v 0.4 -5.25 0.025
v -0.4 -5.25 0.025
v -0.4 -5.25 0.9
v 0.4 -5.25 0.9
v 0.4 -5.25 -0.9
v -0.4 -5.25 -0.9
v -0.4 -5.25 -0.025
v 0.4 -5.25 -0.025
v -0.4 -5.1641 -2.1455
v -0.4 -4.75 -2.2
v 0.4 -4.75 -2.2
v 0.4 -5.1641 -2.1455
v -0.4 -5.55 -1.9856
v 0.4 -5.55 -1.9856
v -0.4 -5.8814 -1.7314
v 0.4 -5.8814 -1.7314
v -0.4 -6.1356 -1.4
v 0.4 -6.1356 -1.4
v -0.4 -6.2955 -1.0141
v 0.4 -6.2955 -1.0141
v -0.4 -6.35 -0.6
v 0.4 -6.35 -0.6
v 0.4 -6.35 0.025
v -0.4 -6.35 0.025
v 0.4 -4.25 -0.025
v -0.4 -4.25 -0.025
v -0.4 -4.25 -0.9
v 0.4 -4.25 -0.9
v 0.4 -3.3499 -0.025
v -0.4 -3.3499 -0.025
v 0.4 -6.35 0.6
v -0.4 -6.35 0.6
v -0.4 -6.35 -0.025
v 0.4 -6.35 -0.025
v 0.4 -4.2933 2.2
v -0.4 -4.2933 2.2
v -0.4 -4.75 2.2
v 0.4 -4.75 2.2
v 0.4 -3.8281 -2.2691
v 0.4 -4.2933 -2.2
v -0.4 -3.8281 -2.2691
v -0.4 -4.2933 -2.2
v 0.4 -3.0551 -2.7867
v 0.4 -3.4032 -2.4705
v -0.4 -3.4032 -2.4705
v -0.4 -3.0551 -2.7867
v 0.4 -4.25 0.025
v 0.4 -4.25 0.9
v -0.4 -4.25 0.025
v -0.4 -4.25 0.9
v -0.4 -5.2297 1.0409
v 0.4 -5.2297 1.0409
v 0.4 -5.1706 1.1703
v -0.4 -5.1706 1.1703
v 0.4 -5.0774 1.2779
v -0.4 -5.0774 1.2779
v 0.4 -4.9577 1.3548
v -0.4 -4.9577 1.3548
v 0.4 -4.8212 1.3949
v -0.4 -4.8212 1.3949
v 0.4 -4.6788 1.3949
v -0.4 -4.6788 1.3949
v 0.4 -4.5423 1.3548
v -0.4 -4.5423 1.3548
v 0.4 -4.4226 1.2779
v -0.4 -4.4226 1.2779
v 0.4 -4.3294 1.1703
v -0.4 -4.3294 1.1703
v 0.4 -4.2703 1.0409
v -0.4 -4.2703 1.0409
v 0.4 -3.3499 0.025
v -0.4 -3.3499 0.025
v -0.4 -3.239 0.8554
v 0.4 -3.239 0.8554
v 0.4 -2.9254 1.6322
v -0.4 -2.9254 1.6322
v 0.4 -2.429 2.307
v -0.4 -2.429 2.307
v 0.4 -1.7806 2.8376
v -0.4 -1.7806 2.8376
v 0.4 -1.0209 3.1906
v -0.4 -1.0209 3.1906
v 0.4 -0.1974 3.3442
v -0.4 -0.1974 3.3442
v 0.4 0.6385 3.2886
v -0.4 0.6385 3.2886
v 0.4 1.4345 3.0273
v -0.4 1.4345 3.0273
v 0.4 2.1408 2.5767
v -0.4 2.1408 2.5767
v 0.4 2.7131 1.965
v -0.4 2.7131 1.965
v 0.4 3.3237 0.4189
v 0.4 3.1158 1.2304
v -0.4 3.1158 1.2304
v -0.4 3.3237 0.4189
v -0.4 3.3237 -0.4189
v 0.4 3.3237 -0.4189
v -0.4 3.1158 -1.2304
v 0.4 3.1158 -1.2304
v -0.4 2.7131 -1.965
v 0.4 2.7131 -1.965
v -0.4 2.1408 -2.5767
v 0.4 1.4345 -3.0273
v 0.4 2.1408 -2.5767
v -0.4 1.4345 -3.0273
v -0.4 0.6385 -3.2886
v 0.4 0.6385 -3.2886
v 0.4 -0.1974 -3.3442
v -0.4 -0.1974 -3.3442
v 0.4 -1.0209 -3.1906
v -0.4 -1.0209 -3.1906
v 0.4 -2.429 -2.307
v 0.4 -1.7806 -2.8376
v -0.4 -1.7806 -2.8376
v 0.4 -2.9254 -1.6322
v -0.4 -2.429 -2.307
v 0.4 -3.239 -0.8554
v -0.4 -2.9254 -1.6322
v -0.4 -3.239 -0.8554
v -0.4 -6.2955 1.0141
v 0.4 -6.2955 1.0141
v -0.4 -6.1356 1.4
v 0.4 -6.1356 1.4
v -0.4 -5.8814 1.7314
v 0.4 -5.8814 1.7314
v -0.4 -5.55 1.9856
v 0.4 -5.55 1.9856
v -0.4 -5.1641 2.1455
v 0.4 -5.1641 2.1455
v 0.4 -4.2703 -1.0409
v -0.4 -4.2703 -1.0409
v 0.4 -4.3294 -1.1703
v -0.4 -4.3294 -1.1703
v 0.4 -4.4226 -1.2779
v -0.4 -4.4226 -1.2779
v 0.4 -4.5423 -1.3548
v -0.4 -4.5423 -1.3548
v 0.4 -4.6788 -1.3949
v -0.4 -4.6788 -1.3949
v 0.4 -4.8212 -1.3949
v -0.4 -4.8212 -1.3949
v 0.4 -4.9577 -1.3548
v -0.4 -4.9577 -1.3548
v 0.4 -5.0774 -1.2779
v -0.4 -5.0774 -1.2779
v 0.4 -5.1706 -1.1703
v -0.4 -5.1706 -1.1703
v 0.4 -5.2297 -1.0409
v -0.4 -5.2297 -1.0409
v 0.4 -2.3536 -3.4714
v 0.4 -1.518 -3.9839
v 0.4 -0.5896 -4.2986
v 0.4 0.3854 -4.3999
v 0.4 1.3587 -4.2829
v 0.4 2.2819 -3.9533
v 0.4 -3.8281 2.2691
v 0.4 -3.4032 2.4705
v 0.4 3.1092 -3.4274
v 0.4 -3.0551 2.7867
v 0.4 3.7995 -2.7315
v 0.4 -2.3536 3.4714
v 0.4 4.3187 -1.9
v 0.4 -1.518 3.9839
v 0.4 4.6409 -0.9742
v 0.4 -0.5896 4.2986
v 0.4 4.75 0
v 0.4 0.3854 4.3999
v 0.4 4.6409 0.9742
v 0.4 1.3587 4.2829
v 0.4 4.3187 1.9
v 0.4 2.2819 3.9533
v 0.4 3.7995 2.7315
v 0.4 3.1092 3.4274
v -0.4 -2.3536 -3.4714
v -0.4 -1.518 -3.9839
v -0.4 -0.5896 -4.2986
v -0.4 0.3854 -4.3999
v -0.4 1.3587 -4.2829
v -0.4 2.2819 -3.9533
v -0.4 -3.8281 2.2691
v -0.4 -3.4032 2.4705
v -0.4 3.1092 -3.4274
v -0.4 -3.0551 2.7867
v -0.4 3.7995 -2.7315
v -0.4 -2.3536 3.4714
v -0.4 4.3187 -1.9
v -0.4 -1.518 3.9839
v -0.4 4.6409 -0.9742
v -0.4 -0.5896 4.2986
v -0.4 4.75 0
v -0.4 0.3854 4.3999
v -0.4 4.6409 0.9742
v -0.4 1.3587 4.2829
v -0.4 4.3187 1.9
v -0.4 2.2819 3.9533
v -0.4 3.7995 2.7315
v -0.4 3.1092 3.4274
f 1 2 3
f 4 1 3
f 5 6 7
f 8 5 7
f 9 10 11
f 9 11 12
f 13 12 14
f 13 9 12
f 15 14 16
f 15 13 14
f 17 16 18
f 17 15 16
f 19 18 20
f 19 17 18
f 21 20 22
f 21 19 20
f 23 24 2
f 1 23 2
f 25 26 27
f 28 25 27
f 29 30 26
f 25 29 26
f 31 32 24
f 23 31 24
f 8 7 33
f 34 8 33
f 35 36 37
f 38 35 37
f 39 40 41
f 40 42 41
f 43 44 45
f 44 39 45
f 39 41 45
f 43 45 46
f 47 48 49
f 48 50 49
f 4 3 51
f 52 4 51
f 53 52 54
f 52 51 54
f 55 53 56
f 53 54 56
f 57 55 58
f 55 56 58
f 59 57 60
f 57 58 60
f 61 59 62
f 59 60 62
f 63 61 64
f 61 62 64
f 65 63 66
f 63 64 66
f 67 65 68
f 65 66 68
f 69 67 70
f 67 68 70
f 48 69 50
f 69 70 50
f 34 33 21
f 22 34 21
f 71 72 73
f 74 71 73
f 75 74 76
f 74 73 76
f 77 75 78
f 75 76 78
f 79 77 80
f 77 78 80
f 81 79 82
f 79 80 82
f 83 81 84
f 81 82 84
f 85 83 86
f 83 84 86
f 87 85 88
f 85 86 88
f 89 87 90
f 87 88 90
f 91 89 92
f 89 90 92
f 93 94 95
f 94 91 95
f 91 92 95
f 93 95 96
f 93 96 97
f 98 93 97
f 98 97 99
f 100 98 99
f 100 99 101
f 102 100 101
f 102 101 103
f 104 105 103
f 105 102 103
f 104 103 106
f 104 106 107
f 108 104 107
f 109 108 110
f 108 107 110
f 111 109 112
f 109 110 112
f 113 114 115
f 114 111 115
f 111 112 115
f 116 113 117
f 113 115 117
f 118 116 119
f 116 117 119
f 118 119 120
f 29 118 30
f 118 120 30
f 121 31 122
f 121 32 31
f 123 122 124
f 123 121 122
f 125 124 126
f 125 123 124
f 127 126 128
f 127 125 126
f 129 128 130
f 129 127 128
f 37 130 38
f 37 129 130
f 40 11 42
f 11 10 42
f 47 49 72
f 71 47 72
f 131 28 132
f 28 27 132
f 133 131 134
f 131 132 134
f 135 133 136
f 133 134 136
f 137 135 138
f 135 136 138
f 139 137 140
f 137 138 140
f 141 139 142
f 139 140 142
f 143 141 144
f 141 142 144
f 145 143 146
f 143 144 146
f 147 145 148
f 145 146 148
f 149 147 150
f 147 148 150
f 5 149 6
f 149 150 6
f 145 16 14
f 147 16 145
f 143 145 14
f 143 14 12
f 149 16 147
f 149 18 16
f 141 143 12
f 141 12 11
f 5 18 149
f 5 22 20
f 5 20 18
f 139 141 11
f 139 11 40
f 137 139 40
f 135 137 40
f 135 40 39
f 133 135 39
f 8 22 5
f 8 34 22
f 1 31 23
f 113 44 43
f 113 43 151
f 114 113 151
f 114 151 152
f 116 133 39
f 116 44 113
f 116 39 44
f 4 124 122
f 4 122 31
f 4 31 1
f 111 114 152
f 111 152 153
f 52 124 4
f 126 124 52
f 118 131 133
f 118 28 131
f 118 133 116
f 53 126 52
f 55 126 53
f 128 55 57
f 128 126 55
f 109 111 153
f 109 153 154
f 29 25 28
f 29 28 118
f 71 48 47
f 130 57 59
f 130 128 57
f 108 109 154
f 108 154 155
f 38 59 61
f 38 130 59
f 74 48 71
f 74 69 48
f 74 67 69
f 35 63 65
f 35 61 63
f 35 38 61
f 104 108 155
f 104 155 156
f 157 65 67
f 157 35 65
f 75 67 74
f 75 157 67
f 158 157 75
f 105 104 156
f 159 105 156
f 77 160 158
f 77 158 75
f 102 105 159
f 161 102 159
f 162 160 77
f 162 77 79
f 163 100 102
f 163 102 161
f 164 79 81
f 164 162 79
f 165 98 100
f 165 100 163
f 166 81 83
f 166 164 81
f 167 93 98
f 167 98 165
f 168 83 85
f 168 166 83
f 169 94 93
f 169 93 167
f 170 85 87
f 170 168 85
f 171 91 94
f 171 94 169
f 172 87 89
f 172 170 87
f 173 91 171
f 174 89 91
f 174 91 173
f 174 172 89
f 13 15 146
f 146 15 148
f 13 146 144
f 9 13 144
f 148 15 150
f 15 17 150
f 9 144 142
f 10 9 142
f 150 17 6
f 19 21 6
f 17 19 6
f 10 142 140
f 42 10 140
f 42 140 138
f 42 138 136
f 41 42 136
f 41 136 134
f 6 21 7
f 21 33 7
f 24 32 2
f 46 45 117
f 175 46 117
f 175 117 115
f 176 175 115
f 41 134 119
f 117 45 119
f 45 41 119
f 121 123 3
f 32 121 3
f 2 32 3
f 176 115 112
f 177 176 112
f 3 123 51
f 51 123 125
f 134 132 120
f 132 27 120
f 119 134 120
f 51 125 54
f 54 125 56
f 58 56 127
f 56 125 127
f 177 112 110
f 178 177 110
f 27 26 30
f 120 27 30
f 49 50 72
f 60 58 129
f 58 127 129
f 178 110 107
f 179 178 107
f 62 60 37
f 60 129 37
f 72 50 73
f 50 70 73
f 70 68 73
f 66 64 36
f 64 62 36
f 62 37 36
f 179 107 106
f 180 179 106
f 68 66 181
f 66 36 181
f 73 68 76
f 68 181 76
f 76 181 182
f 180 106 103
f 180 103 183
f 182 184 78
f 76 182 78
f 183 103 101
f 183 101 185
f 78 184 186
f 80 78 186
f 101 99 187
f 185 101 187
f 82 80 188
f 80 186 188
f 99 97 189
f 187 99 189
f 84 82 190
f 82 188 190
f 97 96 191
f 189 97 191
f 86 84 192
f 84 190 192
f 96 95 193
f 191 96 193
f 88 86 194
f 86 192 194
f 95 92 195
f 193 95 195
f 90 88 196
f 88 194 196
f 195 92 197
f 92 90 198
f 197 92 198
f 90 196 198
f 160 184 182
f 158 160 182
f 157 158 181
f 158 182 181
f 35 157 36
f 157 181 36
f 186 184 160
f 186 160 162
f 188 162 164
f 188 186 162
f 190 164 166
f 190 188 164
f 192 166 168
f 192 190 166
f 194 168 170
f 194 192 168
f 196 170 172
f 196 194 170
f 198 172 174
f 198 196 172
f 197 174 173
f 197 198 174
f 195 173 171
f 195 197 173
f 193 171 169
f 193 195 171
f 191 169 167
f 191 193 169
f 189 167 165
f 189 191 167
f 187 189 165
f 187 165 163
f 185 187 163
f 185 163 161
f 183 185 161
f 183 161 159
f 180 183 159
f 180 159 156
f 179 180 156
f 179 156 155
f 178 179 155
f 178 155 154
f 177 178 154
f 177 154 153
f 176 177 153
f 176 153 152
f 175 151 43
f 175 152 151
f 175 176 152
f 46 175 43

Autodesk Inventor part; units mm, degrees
sketch "Sketch_5" plane through (0, 0, 0) normal (1, 0, 0) x (0, 1, 0)
  arc A0 (-3.0551, -2.7867) -> (-3.0551, 2.7867) centre (0.35, 0) ccw
  arc A1 (-4.2933, 2.2) -> (-3.0551, 2.7867) centre (-4.2933, 3.8) ccw
  line L0 (-4.2933, 2.2) -> (-4.75, 2.2)
  arc A2 (-4.75, 2.2) -> (-6.35, 0.6) centre (-4.75, 0.6) ccw
  line L1 (-6.35, 0.6) -> (-6.35, 0.025)
  line L2 (-6.35, 0.025) -> (-5.25, 0.025)
  line L3 (-5.25, 0.025) -> (-5.25, 0.9)
  arc A3 (-4.25, 0.9) -> (-5.25, 0.9) centre (-4.75, 0.9) ccw
  line L4 (-4.25, 0.9) -> (-4.25, 0.025)
  line L5 (-4.25, 0.025) -> (-3.3499, 0.025)
  arc A4 (-3.3499, -0.025) -> (-3.3499, 0.025) centre (0, 0) ccw
  line L6 (-3.3499, -0.025) -> (-4.25, -0.025)
  line L7 (-4.25, -0.025) -> (-4.25, -0.9)
  arc A5 (-5.25, -0.9) -> (-4.25, -0.9) centre (-4.75, -0.9) ccw
  line L8 (-5.25, -0.9) -> (-5.25, -0.025)
  line L9 (-5.25, -0.025) -> (-6.35, -0.025)
  line L10 (-6.35, -0.025) -> (-6.35, -0.6)
  arc A6 (-6.35, -0.6) -> (-4.75, -2.2) centre (-4.75, -0.6) ccw
  line L11 (-4.75, -2.2) -> (-4.2933, -2.2)
  arc A7 (-3.0551, -2.7867) -> (-4.2933, -2.2) centre (-4.2933, -3.8) ccw
extrude "Extrusion1" add sketch "Sketch_5" along normal mid plane 0.8
ref_plane "1_XY" through (0, 0, 0) normal (1, 0, 0) x (0, 0, -1)
ref_plane "1_YZ" through (0, 0, 0) normal (0, 0, -1) x (0, 1, 0)
ref_plane "1_ZX" through (0, 0, 0) normal (0, 1, 0) x (1, 0, 0)
ref_plane "combination_module_XY" through (0.4, 0, 0) normal (1, 0, 0) x (0, 0, -1)
ref_plane "combination_module_YZ" through (0.4, 0, 0) normal (0, 0, -1) x (0, 1, 0)
ref_plane "combination_module_ZX" through (0.4, 0, 0) normal (0, 1, 0) x (1, 0, 0)
properties part number "STWN7" material "Steel"
